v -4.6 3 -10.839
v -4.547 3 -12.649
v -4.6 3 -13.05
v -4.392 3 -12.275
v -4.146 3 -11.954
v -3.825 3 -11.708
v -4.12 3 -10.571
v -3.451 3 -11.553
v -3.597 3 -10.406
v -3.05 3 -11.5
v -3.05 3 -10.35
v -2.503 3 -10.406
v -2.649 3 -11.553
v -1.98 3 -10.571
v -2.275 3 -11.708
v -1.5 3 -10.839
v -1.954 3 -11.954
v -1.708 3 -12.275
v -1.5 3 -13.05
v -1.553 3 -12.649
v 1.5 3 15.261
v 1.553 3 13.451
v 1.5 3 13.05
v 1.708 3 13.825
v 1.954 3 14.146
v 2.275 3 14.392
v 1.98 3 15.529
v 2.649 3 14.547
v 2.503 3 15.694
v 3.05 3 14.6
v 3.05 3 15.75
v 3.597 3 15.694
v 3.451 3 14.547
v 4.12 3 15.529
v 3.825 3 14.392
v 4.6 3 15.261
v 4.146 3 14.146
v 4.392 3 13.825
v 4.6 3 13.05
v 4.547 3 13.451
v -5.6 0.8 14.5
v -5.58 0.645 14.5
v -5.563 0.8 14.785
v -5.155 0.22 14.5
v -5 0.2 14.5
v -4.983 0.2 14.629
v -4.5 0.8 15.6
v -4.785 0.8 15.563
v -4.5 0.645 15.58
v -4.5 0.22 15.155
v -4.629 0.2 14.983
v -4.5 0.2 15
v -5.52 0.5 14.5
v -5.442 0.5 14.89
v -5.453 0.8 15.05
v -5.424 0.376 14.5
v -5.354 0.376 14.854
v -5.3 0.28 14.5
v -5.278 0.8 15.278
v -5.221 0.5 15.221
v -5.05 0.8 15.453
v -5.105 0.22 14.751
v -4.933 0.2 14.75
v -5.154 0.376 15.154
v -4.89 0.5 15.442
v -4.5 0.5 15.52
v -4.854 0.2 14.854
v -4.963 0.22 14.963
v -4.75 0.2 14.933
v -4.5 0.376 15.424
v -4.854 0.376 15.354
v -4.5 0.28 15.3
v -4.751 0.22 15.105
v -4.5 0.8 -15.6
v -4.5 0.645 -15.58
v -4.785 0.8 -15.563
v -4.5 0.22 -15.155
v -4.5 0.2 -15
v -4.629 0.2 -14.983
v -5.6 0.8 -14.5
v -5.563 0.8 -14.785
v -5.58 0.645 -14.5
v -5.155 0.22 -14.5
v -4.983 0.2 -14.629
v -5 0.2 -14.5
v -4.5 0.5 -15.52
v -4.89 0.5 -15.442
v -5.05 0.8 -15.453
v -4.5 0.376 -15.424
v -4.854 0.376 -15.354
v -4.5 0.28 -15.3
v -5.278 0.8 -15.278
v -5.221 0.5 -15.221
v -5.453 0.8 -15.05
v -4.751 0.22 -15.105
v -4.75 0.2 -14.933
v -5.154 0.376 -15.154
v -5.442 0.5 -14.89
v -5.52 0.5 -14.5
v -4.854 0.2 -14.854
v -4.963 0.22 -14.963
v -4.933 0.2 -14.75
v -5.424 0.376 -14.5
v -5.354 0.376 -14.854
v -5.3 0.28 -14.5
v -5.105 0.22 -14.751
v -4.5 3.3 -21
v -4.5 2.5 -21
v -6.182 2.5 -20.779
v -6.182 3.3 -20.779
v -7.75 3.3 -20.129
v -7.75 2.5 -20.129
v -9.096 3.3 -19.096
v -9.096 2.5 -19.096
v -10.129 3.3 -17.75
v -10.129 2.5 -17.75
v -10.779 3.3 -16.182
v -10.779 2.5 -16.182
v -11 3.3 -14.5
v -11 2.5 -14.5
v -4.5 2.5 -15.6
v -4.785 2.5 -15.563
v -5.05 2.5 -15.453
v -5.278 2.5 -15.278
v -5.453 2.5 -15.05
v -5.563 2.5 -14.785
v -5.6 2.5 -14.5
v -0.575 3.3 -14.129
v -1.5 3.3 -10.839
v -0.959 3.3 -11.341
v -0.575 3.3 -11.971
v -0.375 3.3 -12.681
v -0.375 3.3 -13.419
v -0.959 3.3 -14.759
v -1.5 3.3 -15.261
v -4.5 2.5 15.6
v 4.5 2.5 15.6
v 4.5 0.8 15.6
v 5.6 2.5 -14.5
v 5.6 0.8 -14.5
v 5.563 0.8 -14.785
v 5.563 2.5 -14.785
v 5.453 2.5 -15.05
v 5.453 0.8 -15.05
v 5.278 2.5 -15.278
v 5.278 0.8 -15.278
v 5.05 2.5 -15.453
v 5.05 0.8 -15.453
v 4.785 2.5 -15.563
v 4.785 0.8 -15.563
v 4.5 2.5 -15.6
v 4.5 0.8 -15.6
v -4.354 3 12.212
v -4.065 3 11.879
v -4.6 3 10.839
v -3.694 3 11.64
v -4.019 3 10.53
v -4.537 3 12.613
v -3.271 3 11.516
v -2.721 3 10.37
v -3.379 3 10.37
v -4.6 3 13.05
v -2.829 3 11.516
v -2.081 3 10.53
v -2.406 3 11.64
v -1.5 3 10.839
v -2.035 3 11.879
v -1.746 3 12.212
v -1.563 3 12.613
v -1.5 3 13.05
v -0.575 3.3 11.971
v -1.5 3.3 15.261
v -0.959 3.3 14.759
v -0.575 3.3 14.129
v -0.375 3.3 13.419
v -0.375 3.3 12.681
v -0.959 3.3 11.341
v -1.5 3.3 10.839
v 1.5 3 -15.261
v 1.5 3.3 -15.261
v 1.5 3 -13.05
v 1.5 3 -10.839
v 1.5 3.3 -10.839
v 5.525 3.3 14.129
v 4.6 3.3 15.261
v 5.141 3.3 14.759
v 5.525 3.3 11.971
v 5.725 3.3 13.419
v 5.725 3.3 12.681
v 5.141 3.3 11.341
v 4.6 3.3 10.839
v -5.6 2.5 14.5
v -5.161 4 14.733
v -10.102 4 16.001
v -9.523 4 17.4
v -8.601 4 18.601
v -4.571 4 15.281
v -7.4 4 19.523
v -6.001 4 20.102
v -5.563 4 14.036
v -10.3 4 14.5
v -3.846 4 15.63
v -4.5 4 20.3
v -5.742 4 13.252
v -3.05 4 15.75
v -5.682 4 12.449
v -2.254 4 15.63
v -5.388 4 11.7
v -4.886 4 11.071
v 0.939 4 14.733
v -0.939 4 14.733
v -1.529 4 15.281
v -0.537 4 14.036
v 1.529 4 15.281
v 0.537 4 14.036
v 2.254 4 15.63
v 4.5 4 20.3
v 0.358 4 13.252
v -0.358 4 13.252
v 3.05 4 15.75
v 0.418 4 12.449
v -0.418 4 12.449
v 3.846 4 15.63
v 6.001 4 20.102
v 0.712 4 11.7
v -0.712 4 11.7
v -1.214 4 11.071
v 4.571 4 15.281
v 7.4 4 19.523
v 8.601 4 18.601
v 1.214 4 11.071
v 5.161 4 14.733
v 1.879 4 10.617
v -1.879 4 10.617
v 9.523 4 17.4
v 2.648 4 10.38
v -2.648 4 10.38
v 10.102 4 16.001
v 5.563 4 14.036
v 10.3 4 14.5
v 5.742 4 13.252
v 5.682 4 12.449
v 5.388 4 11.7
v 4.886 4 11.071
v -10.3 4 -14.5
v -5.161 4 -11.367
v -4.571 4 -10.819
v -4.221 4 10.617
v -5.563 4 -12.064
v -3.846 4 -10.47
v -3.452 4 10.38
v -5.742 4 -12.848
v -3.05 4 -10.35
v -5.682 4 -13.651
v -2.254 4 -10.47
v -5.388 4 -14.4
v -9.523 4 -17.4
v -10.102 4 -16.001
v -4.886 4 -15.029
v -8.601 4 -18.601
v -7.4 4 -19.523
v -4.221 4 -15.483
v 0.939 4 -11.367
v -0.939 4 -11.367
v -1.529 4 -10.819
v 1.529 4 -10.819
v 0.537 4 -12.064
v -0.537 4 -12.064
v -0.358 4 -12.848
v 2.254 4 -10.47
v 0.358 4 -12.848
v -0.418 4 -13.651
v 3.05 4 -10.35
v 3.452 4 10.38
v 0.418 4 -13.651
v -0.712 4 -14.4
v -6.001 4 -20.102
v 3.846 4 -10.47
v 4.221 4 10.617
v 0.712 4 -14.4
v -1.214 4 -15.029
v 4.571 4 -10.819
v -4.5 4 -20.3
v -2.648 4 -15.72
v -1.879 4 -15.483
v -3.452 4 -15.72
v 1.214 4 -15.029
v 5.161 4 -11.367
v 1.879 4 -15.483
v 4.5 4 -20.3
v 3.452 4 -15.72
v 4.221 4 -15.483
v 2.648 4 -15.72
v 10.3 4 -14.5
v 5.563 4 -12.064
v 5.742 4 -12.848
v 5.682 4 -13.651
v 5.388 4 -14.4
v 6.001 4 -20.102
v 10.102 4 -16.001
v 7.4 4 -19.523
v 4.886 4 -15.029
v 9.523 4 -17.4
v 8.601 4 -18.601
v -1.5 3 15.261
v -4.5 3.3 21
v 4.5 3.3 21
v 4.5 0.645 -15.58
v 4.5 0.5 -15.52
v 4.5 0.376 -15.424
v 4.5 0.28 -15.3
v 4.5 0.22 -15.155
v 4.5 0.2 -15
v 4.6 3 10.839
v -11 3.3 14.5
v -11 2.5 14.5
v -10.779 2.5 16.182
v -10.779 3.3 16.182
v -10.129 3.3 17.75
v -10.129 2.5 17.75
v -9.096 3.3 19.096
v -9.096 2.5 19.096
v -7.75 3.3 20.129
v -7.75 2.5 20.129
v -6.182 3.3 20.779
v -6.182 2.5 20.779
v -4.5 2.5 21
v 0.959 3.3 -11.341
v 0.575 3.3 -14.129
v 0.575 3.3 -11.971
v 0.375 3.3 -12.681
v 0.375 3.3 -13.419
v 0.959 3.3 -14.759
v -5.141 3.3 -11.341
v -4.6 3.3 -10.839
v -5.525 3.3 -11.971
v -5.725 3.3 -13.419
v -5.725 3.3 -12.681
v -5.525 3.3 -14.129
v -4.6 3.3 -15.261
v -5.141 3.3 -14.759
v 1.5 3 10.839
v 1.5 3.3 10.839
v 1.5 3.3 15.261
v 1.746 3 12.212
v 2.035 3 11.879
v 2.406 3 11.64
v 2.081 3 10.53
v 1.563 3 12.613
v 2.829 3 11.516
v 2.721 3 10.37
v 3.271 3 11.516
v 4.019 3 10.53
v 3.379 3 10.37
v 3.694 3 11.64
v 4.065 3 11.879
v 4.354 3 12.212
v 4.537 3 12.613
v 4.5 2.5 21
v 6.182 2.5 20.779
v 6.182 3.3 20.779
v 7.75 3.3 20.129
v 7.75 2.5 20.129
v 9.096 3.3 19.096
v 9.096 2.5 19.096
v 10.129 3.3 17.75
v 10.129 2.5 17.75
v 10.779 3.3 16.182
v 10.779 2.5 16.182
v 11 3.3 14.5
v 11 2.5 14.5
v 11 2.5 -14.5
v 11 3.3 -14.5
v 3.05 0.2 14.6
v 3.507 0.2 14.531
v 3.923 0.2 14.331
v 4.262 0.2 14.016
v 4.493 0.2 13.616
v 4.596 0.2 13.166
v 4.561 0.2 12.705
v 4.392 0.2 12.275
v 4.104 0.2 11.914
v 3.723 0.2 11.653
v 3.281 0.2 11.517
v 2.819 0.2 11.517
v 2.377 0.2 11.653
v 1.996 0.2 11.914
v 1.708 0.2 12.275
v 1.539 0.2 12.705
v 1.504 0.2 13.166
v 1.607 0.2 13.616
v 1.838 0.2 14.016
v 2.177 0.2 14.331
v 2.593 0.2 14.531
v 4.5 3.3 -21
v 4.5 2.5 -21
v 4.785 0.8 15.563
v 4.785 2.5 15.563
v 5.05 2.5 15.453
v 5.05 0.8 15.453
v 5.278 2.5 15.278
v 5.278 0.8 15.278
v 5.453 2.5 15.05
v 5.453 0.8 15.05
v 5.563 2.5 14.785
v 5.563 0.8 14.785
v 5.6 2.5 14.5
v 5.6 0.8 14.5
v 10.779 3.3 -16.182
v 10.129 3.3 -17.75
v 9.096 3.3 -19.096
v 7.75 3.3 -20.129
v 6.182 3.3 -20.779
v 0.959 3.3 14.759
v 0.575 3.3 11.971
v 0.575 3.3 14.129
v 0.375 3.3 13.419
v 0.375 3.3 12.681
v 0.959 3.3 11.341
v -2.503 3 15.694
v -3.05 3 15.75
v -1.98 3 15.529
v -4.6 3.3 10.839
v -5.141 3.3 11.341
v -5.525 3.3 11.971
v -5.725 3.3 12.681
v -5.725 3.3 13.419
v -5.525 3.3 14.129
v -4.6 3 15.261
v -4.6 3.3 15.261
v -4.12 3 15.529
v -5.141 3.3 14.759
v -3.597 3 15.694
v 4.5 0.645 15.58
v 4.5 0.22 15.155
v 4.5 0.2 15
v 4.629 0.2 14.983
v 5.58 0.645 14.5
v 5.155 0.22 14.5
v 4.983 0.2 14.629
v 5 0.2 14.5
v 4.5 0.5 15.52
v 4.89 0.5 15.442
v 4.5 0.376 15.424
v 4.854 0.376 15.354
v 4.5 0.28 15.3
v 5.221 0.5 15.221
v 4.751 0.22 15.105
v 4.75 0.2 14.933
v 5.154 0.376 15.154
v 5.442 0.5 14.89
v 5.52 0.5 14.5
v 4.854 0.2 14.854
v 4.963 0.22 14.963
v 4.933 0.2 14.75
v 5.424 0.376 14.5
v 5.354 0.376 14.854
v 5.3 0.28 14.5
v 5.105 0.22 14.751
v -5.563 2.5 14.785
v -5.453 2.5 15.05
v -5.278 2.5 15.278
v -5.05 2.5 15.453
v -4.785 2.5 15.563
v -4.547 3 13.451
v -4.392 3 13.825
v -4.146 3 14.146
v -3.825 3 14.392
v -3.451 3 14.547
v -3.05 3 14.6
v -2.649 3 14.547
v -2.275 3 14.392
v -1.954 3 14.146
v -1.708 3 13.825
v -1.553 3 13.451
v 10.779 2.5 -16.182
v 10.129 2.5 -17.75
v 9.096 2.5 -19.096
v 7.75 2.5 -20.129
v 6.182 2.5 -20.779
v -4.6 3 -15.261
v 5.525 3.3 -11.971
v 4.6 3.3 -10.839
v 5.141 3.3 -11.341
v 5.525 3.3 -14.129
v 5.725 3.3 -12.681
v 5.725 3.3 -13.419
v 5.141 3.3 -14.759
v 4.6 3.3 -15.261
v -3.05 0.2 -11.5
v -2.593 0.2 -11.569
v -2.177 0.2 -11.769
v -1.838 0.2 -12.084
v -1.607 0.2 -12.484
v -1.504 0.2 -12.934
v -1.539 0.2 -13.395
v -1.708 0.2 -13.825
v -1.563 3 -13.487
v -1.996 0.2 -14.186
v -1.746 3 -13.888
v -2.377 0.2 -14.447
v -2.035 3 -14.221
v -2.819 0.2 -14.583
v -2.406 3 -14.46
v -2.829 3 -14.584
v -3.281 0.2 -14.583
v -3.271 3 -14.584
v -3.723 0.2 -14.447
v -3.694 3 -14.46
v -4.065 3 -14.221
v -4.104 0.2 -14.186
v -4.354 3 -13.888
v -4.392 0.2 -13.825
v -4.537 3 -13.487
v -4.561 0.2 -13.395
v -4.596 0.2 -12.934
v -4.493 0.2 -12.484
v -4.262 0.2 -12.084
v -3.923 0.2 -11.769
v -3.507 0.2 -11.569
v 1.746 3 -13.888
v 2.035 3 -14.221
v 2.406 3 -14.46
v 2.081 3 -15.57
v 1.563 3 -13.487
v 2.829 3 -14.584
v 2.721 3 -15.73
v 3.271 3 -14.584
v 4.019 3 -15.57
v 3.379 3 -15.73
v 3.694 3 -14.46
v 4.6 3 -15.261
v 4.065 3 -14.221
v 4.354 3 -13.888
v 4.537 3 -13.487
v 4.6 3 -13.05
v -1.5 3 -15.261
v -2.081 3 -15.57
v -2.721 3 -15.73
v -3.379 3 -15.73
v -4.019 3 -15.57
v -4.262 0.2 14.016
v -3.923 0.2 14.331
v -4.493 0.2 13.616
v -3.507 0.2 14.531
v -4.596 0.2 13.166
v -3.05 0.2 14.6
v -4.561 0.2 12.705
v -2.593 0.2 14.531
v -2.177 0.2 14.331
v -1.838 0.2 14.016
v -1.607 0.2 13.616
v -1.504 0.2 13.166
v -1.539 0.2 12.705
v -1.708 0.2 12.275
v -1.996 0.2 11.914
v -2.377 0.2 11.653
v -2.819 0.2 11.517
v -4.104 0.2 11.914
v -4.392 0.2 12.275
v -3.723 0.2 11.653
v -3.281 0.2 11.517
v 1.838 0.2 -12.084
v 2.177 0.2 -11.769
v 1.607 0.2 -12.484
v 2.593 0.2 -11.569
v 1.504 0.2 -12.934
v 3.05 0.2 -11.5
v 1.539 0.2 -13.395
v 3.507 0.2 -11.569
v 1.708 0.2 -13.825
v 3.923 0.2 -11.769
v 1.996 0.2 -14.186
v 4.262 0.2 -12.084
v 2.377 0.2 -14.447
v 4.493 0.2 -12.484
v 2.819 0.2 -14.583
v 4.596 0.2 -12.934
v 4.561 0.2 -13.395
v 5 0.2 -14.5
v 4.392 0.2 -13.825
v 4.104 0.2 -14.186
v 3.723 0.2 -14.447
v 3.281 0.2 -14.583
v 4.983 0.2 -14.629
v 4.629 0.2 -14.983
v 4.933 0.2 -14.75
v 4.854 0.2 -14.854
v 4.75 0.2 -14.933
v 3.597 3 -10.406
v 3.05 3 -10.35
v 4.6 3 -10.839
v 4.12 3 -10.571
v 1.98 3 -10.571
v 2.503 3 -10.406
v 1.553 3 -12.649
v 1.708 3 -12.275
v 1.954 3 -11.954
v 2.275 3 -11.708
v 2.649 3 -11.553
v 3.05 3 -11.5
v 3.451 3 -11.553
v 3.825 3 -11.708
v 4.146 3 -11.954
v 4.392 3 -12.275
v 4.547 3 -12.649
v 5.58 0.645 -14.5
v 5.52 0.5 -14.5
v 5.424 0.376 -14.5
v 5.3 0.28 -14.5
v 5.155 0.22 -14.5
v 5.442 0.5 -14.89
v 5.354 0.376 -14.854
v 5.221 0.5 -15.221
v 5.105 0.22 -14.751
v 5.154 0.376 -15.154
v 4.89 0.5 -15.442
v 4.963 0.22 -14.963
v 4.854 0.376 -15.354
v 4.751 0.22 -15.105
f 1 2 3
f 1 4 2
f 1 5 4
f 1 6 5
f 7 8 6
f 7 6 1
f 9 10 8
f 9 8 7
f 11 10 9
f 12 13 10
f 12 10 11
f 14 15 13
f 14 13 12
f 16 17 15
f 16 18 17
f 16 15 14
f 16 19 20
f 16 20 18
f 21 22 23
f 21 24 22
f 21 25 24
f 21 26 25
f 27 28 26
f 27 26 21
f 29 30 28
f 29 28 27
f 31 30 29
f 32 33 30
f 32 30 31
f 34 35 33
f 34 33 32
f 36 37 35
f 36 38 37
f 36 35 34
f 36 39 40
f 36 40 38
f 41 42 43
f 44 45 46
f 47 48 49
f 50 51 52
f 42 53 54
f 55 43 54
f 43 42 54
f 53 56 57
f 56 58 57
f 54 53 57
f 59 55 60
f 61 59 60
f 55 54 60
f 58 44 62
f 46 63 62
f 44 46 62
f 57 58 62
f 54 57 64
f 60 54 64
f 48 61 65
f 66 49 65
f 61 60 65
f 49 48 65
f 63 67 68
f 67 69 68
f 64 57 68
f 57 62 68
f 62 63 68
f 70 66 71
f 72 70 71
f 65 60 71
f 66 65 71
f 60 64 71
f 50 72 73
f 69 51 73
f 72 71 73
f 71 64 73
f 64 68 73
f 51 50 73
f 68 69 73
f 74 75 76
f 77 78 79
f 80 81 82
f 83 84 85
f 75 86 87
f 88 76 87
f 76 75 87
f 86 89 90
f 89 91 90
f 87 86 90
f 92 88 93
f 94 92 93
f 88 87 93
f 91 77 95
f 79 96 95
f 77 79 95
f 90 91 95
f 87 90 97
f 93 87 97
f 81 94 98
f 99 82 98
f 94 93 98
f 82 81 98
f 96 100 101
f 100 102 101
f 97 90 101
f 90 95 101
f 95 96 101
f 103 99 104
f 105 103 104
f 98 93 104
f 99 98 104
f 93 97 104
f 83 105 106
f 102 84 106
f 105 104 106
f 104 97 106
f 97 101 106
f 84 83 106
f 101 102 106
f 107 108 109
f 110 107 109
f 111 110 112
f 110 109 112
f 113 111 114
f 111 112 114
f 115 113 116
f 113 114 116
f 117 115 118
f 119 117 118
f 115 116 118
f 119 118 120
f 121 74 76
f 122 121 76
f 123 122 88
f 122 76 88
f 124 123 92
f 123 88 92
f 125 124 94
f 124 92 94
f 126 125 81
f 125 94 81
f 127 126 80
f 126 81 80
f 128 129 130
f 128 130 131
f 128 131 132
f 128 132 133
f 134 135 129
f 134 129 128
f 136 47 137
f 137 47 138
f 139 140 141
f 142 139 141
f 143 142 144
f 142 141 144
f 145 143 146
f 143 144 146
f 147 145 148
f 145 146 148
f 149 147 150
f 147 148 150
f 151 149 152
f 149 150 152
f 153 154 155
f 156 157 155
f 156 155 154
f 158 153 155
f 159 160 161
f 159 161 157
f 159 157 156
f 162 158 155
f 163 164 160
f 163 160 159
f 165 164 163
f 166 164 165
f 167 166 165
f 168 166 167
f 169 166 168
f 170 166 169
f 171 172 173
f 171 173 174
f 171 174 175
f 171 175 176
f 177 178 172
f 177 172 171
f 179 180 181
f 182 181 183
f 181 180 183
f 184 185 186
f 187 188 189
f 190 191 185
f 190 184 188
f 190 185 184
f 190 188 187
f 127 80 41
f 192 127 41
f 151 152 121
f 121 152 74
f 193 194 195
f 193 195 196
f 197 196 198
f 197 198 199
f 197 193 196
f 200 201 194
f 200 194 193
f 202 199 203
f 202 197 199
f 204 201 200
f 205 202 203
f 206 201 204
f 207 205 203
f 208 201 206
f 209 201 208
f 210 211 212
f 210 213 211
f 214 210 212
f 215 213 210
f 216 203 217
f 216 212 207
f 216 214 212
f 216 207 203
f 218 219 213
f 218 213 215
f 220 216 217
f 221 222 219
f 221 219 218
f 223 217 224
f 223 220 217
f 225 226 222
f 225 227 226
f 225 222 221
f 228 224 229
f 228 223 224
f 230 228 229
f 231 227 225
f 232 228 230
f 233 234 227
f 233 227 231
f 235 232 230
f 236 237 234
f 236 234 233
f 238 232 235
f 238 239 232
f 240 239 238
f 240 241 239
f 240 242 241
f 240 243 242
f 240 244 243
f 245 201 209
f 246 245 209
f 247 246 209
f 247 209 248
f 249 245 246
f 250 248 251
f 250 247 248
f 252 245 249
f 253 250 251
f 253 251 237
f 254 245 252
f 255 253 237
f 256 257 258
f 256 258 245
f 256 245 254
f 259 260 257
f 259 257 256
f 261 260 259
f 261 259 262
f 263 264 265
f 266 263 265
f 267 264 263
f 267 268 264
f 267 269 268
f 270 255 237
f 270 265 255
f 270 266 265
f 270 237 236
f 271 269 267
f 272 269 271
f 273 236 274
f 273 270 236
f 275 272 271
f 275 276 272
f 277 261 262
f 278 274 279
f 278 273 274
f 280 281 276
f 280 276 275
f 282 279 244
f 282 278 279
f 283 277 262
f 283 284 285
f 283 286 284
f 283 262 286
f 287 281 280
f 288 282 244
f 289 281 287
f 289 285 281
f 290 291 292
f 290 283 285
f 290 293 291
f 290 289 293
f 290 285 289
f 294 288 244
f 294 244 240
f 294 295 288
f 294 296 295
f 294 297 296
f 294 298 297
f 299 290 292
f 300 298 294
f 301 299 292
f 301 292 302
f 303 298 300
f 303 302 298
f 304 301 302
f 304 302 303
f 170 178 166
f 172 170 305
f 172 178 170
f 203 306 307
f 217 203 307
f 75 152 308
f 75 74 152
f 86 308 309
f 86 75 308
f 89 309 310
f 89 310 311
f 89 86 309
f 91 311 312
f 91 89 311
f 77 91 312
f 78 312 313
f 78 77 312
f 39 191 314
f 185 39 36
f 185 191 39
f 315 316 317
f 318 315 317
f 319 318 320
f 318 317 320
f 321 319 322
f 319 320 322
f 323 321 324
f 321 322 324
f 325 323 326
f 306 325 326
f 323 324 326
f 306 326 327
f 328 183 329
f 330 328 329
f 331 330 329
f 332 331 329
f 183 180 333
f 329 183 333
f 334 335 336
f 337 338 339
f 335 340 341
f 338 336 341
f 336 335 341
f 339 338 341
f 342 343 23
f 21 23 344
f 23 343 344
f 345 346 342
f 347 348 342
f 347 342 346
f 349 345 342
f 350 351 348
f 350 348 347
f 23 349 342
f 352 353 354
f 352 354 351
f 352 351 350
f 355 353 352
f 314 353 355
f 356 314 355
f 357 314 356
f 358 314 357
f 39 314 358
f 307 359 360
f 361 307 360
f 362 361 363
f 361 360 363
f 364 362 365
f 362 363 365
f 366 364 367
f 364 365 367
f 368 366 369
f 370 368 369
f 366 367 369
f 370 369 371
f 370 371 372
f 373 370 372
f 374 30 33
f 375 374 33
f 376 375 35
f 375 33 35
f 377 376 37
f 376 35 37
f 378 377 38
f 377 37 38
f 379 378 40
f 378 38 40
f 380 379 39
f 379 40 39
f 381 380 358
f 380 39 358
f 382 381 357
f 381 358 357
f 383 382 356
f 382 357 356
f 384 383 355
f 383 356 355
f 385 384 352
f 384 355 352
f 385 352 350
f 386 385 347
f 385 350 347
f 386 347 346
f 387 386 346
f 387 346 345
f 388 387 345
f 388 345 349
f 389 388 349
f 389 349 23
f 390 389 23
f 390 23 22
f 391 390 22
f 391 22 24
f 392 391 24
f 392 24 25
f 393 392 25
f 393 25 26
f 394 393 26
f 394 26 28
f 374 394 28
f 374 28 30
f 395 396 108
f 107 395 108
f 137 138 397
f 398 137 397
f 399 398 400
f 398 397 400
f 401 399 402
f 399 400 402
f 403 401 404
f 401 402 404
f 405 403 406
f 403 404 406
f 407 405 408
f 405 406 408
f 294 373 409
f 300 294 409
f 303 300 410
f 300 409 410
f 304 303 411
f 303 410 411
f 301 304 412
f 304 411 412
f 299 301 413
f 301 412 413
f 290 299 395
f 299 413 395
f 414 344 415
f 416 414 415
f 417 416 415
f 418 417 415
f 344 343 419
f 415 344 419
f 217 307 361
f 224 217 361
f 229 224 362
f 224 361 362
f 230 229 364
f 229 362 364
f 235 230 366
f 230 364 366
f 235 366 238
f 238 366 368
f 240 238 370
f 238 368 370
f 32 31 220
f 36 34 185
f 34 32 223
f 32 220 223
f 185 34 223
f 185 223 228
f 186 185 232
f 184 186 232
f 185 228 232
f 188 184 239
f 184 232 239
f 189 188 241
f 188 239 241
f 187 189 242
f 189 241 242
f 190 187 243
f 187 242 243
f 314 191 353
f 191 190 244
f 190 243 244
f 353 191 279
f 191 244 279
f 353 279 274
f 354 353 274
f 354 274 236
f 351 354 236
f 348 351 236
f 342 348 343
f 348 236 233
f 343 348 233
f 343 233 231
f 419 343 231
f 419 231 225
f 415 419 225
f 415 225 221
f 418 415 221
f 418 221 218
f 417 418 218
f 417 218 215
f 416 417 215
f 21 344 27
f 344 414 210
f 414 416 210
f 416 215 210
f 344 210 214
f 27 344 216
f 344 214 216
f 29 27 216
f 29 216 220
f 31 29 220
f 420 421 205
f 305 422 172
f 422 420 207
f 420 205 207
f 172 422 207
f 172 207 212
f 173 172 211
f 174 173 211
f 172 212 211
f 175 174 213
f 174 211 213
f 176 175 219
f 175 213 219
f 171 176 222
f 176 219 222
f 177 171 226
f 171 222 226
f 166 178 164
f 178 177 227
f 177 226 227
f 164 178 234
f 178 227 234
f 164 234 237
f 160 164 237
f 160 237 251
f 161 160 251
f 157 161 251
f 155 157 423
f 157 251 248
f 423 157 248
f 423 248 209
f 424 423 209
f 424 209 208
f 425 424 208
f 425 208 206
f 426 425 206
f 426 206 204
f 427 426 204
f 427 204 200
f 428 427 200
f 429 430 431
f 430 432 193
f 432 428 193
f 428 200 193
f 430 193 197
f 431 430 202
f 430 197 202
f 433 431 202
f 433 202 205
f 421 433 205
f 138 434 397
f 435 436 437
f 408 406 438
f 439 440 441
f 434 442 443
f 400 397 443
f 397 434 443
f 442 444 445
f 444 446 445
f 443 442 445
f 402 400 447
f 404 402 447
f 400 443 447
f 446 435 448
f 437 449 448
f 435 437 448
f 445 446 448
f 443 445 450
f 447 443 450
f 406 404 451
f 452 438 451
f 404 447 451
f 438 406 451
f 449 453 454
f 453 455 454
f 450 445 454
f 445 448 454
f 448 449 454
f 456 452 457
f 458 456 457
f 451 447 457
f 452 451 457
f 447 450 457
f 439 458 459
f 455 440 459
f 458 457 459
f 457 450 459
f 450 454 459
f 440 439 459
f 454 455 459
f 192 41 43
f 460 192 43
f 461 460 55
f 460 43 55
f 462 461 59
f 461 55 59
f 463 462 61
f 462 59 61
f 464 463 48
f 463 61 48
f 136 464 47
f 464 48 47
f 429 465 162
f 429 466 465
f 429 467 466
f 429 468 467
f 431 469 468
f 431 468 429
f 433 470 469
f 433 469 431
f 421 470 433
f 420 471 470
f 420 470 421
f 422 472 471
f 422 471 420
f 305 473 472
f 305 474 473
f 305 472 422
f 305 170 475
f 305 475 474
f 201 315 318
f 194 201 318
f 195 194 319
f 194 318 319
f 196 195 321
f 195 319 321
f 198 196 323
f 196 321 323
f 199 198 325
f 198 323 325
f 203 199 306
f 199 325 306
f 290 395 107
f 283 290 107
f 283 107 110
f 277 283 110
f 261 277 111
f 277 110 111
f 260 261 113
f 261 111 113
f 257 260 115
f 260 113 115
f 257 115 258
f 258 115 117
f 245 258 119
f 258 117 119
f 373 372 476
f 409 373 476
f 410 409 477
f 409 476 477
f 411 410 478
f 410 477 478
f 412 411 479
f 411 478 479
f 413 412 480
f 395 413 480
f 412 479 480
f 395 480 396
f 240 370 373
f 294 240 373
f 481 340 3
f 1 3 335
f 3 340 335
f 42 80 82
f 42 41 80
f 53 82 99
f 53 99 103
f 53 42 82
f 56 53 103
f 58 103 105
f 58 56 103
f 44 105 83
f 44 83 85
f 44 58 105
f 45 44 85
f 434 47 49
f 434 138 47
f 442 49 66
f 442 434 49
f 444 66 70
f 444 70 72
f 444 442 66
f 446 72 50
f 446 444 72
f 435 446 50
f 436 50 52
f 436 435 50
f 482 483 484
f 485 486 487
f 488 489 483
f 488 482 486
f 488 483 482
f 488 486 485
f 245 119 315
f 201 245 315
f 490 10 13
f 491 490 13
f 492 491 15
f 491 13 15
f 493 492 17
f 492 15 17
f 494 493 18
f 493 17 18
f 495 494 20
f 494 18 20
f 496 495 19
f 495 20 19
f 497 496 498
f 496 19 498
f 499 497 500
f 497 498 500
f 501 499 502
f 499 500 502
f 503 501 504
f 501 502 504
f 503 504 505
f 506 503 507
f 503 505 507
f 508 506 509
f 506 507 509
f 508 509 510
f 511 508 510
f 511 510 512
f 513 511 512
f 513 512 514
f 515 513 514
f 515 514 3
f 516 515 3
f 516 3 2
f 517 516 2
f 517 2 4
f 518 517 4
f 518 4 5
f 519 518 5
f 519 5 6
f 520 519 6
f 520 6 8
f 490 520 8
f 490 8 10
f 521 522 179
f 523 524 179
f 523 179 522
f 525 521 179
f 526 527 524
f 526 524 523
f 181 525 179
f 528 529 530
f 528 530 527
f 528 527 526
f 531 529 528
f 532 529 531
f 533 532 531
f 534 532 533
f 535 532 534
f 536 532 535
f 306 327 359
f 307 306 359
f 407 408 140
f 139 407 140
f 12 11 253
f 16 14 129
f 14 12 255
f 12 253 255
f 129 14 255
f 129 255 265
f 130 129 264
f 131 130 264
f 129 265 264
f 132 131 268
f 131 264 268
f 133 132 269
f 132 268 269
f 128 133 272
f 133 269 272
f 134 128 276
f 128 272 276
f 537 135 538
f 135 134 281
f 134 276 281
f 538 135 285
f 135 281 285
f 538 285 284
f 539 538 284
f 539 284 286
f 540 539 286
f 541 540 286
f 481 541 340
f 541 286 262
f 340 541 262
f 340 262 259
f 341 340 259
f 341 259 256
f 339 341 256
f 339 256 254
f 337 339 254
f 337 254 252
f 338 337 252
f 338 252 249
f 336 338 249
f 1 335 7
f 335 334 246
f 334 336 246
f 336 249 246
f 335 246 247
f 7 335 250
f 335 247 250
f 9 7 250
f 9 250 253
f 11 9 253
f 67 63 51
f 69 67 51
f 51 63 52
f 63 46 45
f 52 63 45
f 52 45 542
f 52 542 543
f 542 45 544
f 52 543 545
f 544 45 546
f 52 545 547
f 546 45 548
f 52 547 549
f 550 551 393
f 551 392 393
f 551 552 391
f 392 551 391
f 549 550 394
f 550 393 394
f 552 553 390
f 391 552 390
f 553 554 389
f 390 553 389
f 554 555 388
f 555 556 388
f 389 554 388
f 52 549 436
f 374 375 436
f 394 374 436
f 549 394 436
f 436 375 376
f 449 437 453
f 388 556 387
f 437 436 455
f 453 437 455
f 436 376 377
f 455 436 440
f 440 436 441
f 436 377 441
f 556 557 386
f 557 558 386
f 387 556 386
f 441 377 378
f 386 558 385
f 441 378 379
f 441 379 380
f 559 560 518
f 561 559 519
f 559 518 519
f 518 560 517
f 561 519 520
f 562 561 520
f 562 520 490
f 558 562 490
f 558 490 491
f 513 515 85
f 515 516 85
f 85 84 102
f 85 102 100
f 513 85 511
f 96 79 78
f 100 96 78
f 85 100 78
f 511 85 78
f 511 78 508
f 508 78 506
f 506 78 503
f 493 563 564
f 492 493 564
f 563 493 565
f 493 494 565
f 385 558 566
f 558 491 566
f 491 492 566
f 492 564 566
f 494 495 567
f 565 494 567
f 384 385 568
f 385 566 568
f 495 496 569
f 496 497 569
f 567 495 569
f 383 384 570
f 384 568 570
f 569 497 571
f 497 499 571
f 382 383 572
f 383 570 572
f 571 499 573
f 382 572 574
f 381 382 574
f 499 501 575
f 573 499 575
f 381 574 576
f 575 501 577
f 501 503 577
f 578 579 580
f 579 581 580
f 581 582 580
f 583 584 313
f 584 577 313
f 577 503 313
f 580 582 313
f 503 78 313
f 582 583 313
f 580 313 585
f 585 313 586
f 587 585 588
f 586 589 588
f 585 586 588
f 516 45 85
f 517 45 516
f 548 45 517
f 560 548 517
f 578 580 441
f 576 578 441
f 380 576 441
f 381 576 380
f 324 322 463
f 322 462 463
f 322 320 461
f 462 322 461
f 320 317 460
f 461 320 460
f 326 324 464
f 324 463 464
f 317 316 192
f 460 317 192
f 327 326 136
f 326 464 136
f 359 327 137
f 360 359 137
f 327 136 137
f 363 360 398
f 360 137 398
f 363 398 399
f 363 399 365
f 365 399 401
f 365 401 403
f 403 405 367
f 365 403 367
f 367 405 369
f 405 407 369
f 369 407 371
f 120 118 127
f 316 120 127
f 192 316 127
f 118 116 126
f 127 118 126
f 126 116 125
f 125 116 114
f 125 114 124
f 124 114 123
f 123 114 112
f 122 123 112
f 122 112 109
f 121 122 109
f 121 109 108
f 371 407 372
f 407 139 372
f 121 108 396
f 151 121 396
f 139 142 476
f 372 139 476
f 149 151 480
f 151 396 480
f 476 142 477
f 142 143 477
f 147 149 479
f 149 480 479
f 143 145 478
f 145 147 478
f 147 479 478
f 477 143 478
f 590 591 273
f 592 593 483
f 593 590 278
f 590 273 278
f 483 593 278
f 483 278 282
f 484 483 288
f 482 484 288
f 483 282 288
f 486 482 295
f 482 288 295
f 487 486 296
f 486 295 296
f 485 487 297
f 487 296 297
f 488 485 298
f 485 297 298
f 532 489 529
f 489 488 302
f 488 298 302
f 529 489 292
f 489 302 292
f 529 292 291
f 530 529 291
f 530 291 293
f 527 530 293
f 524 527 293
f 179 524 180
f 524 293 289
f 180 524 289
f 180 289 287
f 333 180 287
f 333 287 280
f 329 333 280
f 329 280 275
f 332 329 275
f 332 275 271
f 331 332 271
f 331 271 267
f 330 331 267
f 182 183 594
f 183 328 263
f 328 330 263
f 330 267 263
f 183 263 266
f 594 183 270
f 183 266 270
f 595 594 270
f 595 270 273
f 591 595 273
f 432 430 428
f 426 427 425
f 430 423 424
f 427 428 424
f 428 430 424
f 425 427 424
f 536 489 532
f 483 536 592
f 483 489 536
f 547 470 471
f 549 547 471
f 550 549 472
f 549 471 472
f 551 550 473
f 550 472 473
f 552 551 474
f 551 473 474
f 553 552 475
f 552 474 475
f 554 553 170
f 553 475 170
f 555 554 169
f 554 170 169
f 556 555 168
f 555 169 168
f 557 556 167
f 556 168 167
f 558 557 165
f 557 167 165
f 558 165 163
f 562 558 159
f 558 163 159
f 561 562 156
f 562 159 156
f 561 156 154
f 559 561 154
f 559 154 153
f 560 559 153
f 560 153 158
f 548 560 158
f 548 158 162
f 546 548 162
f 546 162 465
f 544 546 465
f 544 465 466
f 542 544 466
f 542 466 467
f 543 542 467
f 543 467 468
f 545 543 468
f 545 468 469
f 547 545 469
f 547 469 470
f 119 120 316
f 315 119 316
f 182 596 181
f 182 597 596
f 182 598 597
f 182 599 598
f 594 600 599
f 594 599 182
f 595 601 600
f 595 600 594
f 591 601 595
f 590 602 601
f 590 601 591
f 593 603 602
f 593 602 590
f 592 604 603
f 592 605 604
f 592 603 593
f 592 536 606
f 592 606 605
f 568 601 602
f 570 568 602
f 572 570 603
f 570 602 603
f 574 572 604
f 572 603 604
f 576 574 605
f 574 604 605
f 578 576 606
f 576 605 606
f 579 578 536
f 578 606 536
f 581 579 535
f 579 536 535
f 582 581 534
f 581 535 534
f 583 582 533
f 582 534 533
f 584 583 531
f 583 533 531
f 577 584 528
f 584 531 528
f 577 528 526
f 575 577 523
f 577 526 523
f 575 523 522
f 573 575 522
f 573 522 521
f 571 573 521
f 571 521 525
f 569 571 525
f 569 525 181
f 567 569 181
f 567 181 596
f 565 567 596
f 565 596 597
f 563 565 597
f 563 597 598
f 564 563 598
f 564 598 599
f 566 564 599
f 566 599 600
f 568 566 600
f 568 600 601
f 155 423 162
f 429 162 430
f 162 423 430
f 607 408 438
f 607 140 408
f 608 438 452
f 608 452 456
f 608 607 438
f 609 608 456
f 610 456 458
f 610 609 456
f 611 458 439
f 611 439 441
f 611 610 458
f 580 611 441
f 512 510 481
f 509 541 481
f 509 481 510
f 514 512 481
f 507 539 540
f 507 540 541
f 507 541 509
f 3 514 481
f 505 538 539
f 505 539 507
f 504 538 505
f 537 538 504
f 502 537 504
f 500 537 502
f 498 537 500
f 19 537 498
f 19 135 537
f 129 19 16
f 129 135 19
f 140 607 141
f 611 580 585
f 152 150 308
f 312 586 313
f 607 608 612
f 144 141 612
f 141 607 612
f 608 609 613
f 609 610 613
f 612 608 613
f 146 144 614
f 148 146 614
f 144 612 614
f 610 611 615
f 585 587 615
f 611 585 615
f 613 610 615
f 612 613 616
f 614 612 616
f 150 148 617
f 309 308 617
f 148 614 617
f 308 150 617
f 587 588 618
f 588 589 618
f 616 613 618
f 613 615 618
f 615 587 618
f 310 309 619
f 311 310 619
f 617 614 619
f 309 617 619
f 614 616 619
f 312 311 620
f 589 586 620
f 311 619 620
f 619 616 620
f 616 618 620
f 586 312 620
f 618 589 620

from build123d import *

# Parameters (mm, degrees)
BOSS_EXTRUDE1_START = 0.2
BOSS_EXTRUDE1_DEPTH = 2.3
BOSS_EXTRUDE2_DEPTH = 1.5
SKETCH3_R           = 1.55
CUT_EXTRUDE1_DEPTH  = 25.009164917
CHAMFER1_SIZE       = 0.7
FILLET1_R           = 0.6
SKETCH4_R           = 2.7
CUT_EXTRUDE2_DEPTH  = 1
BOSS_EXTRUDE3_START = 0.3
BOSS_EXTRUDE3_DEPTH = 0.3


with BuildPart() as part:
    # Sketch1 → Boss-Extrude1 (new body)
    with BuildSketch(Plane(origin=(0, 0, 0), x_dir=(1, 0, 0), z_dir=(0, 1, 0)).offset(BOSS_EXTRUDE1_START)):
        with BuildLine():
            Line((5.6, -14.5), (5.6, 14.5))
            ThreePointArc((5.6, 14.5), (5.277817459, 15.277817459), (4.5, 15.6))
            Line((4.5, 15.6), (-4.5, 15.6))
            ThreePointArc((-4.5, 15.6), (-5.277817459, 15.277817459), (-5.6, 14.5))
            Line((-5.6, 14.5), (-5.6, -14.5))
            ThreePointArc((-5.6, -14.5), (-5.277817459, -15.277817459), (-4.5, -15.6))
            Line((-4.5, -15.6), (4.5, -15.6))
            ThreePointArc((4.5, -15.6), (5.277817459, -15.277817459), (5.6, -14.5))
        make_face()
    extrude(amount=BOSS_EXTRUDE1_DEPTH)

    # Sketch2 → Boss-Extrude2 (add)
    with BuildSketch(Plane(origin=(0, 2.5, 0), x_dir=(1, 0, 0), z_dir=(0, 1, 0))):
        with BuildLine():
            Line((-4.5, -21), (4.5, -21))
            ThreePointArc((4.5, -21), (9.096194078, -19.096194078), (11, -14.5))
            Line((11, -14.5), (11, 14.5))
            ThreePointArc((11, 14.5), (9.096194078, 19.096194078), (4.5, 21))
            Line((4.5, 21), (-4.5, 21))
            ThreePointArc((-4.5, 21), (-9.096194078, 19.096194078), (-11, 14.5))
            Line((-11, 14.5), (-11, -14.5))
            ThreePointArc((-11, -14.5), (-9.096194078, -19.096194078), (-4.5, -21))
        make_face()
    extrude(amount=BOSS_EXTRUDE2_DEPTH)

    # Sketch3 → Cut-Extrude1 (cut, through all)
    with BuildSketch(Plane(origin=(0, 4, 0), x_dir=(1, 0, 0), z_dir=(0, 1, 0))):
        with Locations(Location((3.05, -13.05, 0), (0, 0, 270))):
            Circle(SKETCH3_R)
        with Locations(Location((3.05, 13.05, 0), (0, 0, 270))):
            Circle(SKETCH3_R)
        with Locations(Location((-3.05, 13.05, 0), (0, 0, 270))):
            Circle(SKETCH3_R)
        with Locations(Location((-3.05, -13.05, 0), (0, 0, 270))):
            Circle(SKETCH3_R)
    extrude(amount=-CUT_EXTRUDE1_DEPTH, mode=Mode.SUBTRACT)

    # Chamfer1
    chamfer1_edges = [part.edges().sort_by_distance(p)[0] for p in [
        (-11, 4, 0),
        (-9.096194078, 4, 19.096194078),
        (0, 4, 21),
        (9.096194078, 4, 19.096194078),
        (11, 4, 0),
        (9.096194078, 4, -19.096194078),
        (0, 4, -21),
        (-9.096194078, 4, -19.096194078),
    ]]
    chamfer(chamfer1_edges, length=CHAMFER1_SIZE)

    # Fillet1
    fillet1_edges = [part.edges().sort_by_distance(p)[0] for p in [
        (0, 0.2, -15.6),
        (5.277817459, 0.2, -15.277817459),
        (5.6, 0.2, 0),
        (5.277817459, 0.2, 15.277817459),
        (0, 0.2, 15.6),
        (-5.277817459, 0.2, 15.277817459),
        (-5.6, 0.2, 0),
        (-5.277817459, 0.2, -15.277817459),
    ]]
    fillet(fillet1_edges, radius=FILLET1_R)

    # Sketch4 → Cut-Extrude2 (cut)
    with BuildSketch(Plane(origin=(0, 4, 0), x_dir=(1, 0, 0), z_dir=(0, 1, 0))):
        with Locations(Location((-3.05, 13.05, 0), (0, 0, 270))):
            Circle(SKETCH4_R)
        with Locations(Location((3.05, 13.05, 0), (0, 0, 270))):
            Circle(SKETCH4_R)
        with Locations(Location((-3.05, -13.05, 0), (0, 0, 270))):
            Circle(SKETCH4_R)
        with Locations(Location((3.05, -13.05, 0), (0, 0, 270))):
            Circle(SKETCH4_R)
    extrude(amount=-CUT_EXTRUDE2_DEPTH, mode=Mode.SUBTRACT)

    # Sketch5 → Boss-Extrude3 (add)
    with BuildSketch(Plane(origin=(0, 3, 0), x_dir=(1, 0, 0), z_dir=(0, 1, 0)).offset(BOSS_EXTRUDE3_START)):
        with BuildLine():
            Line((4.6, 15.260769097), (4.6, 10.839230903))
            ThreePointArc((4.6, 10.839230903), (5.75, 13.05), (4.6, 15.260769097))
        make_face()
        with BuildLine():
            Line((1.5, 15.260769097), (1.5, 10.839230903))
            ThreePointArc((1.5, 10.839230903), (0.35, 13.05), (1.5, 15.260769097))
        make_face()
        with BuildLine():
            Line((-4.6, 15.260769097), (-4.6, 10.839230903))
            ThreePointArc((-4.6, 10.839230903), (-5.75, 13.05), (-4.6, 15.260769097))
        make_face()
        with BuildLine():
            Line((-1.5, 15.260769097), (-1.5, 10.839230903))
            ThreePointArc((-1.5, 10.839230903), (-0.35, 13.05), (-1.5, 15.260769097))
        make_face()
        with BuildLine():
            Line((-4.6, -10.839230903), (-4.6, -15.260769097))
            ThreePointArc((-4.6, -15.260769097), (-5.75, -13.05), (-4.6, -10.839230903))
        make_face()
        with BuildLine():
            Line((-1.5, -10.839230903), (-1.5, -15.260769097))
            ThreePointArc((-1.5, -15.260769097), (-0.35, -13.05), (-1.5, -10.839230903))
        make_face()
        with BuildLine():
            Line((1.5, -10.839230903), (1.5, -15.260769097))
            ThreePointArc((1.5, -15.260769097), (0.35, -13.05), (1.5, -10.839230903))
        make_face()
        with BuildLine():
            Line((4.6, -10.839230903), (4.6, -15.260769097))
            ThreePointArc((4.6, -15.260769097), (5.75, -13.05), (4.6, -10.839230903))
        make_face()
    extrude(amount=-BOSS_EXTRUDE3_DEPTH)


solid = part.part
